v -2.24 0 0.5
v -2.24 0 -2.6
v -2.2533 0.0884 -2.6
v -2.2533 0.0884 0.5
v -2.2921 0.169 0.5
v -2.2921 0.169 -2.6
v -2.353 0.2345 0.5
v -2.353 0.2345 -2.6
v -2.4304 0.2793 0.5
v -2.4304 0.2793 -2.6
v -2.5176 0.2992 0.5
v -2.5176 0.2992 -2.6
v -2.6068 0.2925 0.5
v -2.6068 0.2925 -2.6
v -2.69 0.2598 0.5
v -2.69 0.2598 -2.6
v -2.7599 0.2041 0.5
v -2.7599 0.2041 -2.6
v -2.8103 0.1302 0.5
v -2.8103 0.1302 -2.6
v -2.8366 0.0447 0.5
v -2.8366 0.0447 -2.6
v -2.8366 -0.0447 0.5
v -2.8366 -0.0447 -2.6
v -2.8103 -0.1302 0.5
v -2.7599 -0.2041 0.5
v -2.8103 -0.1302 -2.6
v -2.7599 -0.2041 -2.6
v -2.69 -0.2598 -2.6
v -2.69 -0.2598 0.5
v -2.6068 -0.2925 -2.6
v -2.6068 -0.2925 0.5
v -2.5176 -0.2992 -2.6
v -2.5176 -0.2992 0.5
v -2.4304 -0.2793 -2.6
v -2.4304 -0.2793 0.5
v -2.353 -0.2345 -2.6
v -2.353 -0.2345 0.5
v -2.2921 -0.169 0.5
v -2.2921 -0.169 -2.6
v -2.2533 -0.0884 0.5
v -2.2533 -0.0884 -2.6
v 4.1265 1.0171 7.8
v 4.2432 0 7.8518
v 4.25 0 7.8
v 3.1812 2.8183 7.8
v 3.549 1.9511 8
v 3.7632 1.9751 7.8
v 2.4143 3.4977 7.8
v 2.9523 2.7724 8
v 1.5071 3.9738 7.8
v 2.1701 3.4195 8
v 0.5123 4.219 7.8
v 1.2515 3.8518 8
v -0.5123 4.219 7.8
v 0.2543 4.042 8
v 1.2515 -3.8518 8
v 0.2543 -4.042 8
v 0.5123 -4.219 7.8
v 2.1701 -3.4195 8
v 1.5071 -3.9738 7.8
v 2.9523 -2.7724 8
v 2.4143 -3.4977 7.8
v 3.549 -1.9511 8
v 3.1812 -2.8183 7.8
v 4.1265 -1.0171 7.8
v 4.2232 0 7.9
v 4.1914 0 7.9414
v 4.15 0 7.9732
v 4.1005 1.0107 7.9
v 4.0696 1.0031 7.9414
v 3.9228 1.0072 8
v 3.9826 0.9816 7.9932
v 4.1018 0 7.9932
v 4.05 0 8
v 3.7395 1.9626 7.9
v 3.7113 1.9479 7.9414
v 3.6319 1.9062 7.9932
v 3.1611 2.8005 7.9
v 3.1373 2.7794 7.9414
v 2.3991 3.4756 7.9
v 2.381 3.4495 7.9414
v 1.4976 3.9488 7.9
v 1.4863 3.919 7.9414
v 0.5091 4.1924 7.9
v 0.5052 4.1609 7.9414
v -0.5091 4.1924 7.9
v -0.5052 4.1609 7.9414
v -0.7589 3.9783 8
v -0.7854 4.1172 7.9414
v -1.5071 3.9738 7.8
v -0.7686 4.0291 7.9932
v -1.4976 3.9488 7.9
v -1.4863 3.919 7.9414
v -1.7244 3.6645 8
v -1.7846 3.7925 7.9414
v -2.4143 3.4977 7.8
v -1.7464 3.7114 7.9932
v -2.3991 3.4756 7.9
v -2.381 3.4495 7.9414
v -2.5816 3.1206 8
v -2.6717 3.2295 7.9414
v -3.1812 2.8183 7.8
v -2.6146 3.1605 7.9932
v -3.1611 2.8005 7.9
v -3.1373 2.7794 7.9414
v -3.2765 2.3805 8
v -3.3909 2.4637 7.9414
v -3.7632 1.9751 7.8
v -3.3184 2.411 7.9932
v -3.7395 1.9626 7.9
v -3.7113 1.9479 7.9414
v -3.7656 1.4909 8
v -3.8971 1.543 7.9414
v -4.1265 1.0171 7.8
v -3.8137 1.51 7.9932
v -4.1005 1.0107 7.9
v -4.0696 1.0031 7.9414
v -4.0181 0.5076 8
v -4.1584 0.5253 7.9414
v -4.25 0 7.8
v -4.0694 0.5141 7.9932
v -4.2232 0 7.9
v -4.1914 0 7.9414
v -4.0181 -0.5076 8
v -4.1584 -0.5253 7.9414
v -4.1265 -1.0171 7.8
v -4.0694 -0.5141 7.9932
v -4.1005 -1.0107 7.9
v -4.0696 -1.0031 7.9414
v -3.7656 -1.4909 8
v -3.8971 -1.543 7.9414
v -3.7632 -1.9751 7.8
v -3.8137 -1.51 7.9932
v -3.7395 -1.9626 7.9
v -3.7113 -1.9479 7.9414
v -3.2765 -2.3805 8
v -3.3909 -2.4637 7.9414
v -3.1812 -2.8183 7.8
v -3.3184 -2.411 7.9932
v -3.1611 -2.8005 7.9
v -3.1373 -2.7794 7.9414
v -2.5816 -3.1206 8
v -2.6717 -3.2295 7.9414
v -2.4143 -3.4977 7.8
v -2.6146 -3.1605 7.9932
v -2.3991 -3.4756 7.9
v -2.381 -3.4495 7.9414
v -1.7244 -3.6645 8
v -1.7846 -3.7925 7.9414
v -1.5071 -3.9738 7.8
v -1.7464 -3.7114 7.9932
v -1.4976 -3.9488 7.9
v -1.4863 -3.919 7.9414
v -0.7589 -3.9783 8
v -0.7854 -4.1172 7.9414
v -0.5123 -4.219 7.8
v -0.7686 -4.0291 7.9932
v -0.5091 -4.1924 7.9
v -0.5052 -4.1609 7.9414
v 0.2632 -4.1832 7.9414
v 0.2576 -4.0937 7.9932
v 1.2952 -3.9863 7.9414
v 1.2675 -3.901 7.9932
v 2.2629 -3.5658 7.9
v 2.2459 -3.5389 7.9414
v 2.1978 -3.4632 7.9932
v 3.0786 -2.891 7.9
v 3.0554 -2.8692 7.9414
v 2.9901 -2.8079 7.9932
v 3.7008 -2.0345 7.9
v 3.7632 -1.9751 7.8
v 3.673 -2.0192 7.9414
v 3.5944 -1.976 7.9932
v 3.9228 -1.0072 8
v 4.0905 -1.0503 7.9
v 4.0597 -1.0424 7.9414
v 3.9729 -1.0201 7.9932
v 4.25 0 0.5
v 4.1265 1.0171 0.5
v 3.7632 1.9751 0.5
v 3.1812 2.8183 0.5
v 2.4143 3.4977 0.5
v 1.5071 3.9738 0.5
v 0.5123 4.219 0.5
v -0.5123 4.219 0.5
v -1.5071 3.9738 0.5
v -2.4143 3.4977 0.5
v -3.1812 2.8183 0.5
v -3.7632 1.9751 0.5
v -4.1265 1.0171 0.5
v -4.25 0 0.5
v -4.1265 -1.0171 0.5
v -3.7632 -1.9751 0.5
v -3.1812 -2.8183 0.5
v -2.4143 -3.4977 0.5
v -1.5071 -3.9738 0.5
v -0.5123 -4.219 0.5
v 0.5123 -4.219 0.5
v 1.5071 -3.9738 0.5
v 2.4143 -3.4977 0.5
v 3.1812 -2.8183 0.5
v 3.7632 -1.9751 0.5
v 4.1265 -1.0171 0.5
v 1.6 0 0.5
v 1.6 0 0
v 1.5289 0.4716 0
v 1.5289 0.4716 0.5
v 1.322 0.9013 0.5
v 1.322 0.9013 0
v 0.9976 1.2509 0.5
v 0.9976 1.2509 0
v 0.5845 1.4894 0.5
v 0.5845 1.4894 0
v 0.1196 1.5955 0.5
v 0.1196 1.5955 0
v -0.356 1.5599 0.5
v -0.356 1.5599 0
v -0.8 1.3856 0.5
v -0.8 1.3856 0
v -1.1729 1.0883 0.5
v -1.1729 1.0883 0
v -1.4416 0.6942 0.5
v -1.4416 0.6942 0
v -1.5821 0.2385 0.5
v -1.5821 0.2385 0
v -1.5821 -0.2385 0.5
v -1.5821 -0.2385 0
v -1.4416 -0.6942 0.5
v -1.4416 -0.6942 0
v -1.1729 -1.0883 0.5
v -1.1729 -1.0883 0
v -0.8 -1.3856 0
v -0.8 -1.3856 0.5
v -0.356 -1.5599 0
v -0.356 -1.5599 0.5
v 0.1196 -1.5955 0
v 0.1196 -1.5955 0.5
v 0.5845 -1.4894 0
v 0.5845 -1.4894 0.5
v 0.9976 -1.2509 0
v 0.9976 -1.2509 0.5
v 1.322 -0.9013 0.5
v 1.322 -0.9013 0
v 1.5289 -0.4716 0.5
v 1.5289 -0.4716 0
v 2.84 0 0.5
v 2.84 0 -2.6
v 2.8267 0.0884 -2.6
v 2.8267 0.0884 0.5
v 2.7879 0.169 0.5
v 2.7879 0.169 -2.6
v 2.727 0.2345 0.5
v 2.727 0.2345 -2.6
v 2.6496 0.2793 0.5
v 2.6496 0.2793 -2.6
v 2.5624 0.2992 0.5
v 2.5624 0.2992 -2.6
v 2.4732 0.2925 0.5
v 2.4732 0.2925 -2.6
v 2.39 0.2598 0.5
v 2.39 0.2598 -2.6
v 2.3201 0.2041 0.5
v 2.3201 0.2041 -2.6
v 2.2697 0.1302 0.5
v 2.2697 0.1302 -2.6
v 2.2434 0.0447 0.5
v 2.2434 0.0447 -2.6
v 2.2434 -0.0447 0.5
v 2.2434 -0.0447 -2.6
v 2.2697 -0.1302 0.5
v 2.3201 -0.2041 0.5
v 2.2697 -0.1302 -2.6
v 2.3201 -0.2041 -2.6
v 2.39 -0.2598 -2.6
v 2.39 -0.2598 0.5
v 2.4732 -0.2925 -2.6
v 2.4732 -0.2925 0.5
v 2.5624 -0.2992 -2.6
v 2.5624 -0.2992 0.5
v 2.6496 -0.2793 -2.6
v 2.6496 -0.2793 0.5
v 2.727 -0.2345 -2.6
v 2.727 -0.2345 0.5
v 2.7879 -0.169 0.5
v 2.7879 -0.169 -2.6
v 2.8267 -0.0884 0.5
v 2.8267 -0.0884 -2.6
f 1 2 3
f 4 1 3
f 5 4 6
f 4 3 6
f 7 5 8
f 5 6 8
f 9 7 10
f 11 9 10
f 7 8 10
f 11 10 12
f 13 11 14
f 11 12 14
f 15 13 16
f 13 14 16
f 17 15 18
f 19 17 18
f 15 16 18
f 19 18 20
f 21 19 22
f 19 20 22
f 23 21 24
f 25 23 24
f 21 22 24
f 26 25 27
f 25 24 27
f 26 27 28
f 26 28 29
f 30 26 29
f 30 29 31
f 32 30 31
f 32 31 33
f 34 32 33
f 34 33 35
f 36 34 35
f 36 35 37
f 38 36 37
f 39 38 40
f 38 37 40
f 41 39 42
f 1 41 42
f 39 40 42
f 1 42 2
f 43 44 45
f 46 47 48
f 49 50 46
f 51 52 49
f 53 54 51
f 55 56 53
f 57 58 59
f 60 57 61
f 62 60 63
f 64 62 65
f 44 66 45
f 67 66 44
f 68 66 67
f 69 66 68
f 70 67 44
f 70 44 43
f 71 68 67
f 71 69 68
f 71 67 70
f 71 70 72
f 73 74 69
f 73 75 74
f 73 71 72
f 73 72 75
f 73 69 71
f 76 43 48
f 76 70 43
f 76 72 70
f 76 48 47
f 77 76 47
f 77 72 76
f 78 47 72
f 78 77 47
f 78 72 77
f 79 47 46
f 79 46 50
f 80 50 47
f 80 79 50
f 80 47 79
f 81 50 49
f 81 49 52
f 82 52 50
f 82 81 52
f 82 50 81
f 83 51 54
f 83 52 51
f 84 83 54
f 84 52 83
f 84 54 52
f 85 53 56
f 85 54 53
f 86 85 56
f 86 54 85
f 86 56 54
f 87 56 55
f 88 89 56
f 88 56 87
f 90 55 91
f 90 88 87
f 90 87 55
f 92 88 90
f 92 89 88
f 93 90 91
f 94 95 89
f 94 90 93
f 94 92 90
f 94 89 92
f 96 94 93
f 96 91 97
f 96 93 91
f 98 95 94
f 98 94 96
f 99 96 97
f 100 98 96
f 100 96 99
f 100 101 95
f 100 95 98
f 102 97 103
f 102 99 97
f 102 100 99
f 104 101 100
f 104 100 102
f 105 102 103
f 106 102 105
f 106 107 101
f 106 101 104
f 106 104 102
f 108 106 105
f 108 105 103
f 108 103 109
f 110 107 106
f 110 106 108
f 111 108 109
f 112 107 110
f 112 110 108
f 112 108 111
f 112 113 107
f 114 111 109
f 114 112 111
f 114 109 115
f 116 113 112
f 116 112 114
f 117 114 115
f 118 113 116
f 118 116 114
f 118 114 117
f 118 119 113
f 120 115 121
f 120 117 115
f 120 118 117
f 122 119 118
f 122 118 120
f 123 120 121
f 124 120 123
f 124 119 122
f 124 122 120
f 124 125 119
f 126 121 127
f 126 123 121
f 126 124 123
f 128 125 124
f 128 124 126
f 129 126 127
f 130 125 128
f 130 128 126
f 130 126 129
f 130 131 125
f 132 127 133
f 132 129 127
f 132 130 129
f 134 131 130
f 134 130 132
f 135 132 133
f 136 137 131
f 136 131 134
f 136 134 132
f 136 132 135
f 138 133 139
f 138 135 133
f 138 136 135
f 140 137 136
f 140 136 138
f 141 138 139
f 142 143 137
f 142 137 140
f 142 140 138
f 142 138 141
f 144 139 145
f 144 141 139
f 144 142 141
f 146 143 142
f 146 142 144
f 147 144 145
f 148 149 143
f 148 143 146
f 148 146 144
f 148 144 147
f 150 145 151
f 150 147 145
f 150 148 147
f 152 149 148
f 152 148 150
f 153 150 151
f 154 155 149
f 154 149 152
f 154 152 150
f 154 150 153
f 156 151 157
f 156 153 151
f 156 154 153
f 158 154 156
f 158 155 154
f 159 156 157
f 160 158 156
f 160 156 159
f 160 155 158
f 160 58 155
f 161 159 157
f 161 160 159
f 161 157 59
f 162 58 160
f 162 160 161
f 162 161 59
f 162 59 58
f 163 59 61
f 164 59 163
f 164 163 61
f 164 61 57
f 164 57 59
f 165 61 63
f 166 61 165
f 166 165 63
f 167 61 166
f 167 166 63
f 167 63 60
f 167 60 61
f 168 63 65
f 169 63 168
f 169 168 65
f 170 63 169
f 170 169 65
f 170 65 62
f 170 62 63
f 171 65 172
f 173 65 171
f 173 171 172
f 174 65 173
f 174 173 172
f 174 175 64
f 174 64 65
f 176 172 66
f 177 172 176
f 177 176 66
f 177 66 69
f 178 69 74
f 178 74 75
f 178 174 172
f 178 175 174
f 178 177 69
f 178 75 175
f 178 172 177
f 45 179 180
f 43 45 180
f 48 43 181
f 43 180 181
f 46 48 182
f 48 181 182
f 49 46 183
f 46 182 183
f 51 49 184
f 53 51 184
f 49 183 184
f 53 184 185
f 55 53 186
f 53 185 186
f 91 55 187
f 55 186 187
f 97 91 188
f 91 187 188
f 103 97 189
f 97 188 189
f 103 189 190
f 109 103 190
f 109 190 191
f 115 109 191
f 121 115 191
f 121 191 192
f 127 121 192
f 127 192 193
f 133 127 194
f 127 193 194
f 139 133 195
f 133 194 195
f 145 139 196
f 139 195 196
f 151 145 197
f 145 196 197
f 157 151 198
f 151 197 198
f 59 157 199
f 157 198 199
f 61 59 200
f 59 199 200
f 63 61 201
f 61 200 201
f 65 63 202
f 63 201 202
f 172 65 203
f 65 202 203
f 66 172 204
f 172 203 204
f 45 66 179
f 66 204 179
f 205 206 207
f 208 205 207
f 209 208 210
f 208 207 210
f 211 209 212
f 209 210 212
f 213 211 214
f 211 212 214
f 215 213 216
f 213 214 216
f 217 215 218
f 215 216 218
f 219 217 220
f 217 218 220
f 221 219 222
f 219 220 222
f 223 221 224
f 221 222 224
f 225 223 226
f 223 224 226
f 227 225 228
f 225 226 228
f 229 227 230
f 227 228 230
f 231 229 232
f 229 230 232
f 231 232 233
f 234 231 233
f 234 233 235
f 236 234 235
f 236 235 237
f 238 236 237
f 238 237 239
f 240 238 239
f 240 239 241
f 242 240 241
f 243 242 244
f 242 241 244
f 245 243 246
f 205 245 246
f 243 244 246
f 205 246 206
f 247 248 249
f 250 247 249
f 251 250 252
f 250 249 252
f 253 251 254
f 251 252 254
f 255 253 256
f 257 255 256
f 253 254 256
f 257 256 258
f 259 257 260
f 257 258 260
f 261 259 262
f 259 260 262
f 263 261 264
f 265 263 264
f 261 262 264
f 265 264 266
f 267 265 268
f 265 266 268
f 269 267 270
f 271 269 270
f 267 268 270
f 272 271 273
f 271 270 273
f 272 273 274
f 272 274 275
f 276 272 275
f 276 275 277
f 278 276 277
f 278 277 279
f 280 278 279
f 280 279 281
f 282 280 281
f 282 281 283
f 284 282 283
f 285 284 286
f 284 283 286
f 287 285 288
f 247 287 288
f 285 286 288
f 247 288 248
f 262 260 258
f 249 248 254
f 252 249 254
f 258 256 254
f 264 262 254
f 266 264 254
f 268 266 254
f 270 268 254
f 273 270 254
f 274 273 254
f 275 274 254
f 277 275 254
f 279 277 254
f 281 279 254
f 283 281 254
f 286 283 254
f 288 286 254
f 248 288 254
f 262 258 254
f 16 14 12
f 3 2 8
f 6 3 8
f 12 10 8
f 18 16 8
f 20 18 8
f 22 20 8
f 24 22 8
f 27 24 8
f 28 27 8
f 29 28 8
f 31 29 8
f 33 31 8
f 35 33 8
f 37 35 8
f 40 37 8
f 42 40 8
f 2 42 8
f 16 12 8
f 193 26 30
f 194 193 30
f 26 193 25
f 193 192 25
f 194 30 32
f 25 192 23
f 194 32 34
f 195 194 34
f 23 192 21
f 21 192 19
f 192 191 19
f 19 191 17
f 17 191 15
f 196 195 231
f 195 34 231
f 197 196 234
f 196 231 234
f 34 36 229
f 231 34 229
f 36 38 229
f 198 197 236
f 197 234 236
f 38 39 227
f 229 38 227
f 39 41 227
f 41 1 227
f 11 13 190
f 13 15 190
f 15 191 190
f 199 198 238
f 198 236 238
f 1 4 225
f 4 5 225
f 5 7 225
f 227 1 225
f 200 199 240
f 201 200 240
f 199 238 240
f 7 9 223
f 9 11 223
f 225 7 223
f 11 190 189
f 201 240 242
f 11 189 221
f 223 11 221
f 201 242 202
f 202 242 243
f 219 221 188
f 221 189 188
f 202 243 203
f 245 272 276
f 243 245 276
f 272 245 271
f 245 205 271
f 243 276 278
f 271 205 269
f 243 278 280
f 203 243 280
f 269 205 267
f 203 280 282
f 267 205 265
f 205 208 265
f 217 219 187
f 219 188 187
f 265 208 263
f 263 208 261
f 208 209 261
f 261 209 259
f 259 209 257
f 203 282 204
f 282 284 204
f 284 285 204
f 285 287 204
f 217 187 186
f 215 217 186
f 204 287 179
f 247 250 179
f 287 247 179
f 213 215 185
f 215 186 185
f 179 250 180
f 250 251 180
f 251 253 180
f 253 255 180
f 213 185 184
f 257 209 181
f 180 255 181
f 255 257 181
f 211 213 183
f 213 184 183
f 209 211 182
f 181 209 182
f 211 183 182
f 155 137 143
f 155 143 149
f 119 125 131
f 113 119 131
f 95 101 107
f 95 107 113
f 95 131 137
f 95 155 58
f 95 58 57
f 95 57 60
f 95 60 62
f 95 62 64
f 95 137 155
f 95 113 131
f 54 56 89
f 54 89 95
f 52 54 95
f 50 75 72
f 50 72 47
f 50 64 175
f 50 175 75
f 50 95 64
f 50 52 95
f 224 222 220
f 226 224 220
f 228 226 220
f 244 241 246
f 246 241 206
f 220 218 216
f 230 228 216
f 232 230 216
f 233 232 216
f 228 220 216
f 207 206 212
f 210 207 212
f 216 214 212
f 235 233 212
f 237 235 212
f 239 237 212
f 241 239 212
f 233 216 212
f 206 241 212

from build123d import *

# Parameters (mm, degrees)
CYLINDER002_R     = 0.3
CYLINDER002_DEPTH = 3.1
CYLINDER003_R     = 0.3
CYLINDER003_DEPTH = 3.1
CYLINDER001_R     = 1.6
CYLINDER001_DEPTH = 0.5
CYLINDER_R        = 4.25
CYLINDER_DEPTH    = 7.5
FILLET_R          = 0.2


with BuildPart() as pin1:
    # Cylinder002 → Cylinder002 (new body)
    with BuildSketch(Plane(origin=(-2.54, 0, -2.6), x_dir=(1, 0, 0), z_dir=(0, 0, 1))):
        Circle(CYLINDER002_R)
    extrude(amount=CYLINDER002_DEPTH)


with BuildPart() as pin2:
    # Cylinder003 → Cylinder003 (new body)
    with BuildSketch(Plane(origin=(2.54, 0, -2.6), x_dir=(1, 0, 0), z_dir=(0, 0, 1))):
        Circle(CYLINDER003_R)
    extrude(amount=CYLINDER003_DEPTH)


with BuildPart() as fuss:
    # Cylinder001 → Cylinder001 (new body)
    with BuildSketch(Plane.XY):
        Circle(CYLINDER001_R)
    extrude(amount=CYLINDER001_DEPTH)


with BuildPart() as fuse_tr5:
    # Cylinder → Cylinder (new body)
    with BuildSketch(Plane.XY.offset(0.5)):
        Circle(CYLINDER_R)
    extrude(amount=CYLINDER_DEPTH)

    # Fusion: union Fuss
    add(fuss.part)

    # Fillet
    fillet_edges = [fuse_tr5.edges().sort_by_distance(p)[0] for p in [
        (-4.25, 0, 8),
    ]]
    fillet(fillet_edges, radius=FILLET_R)

    # Fusion001: union pin1, pin2
    add(pin1.part)
    add(pin2.part)


solid = fuse_tr5.part
